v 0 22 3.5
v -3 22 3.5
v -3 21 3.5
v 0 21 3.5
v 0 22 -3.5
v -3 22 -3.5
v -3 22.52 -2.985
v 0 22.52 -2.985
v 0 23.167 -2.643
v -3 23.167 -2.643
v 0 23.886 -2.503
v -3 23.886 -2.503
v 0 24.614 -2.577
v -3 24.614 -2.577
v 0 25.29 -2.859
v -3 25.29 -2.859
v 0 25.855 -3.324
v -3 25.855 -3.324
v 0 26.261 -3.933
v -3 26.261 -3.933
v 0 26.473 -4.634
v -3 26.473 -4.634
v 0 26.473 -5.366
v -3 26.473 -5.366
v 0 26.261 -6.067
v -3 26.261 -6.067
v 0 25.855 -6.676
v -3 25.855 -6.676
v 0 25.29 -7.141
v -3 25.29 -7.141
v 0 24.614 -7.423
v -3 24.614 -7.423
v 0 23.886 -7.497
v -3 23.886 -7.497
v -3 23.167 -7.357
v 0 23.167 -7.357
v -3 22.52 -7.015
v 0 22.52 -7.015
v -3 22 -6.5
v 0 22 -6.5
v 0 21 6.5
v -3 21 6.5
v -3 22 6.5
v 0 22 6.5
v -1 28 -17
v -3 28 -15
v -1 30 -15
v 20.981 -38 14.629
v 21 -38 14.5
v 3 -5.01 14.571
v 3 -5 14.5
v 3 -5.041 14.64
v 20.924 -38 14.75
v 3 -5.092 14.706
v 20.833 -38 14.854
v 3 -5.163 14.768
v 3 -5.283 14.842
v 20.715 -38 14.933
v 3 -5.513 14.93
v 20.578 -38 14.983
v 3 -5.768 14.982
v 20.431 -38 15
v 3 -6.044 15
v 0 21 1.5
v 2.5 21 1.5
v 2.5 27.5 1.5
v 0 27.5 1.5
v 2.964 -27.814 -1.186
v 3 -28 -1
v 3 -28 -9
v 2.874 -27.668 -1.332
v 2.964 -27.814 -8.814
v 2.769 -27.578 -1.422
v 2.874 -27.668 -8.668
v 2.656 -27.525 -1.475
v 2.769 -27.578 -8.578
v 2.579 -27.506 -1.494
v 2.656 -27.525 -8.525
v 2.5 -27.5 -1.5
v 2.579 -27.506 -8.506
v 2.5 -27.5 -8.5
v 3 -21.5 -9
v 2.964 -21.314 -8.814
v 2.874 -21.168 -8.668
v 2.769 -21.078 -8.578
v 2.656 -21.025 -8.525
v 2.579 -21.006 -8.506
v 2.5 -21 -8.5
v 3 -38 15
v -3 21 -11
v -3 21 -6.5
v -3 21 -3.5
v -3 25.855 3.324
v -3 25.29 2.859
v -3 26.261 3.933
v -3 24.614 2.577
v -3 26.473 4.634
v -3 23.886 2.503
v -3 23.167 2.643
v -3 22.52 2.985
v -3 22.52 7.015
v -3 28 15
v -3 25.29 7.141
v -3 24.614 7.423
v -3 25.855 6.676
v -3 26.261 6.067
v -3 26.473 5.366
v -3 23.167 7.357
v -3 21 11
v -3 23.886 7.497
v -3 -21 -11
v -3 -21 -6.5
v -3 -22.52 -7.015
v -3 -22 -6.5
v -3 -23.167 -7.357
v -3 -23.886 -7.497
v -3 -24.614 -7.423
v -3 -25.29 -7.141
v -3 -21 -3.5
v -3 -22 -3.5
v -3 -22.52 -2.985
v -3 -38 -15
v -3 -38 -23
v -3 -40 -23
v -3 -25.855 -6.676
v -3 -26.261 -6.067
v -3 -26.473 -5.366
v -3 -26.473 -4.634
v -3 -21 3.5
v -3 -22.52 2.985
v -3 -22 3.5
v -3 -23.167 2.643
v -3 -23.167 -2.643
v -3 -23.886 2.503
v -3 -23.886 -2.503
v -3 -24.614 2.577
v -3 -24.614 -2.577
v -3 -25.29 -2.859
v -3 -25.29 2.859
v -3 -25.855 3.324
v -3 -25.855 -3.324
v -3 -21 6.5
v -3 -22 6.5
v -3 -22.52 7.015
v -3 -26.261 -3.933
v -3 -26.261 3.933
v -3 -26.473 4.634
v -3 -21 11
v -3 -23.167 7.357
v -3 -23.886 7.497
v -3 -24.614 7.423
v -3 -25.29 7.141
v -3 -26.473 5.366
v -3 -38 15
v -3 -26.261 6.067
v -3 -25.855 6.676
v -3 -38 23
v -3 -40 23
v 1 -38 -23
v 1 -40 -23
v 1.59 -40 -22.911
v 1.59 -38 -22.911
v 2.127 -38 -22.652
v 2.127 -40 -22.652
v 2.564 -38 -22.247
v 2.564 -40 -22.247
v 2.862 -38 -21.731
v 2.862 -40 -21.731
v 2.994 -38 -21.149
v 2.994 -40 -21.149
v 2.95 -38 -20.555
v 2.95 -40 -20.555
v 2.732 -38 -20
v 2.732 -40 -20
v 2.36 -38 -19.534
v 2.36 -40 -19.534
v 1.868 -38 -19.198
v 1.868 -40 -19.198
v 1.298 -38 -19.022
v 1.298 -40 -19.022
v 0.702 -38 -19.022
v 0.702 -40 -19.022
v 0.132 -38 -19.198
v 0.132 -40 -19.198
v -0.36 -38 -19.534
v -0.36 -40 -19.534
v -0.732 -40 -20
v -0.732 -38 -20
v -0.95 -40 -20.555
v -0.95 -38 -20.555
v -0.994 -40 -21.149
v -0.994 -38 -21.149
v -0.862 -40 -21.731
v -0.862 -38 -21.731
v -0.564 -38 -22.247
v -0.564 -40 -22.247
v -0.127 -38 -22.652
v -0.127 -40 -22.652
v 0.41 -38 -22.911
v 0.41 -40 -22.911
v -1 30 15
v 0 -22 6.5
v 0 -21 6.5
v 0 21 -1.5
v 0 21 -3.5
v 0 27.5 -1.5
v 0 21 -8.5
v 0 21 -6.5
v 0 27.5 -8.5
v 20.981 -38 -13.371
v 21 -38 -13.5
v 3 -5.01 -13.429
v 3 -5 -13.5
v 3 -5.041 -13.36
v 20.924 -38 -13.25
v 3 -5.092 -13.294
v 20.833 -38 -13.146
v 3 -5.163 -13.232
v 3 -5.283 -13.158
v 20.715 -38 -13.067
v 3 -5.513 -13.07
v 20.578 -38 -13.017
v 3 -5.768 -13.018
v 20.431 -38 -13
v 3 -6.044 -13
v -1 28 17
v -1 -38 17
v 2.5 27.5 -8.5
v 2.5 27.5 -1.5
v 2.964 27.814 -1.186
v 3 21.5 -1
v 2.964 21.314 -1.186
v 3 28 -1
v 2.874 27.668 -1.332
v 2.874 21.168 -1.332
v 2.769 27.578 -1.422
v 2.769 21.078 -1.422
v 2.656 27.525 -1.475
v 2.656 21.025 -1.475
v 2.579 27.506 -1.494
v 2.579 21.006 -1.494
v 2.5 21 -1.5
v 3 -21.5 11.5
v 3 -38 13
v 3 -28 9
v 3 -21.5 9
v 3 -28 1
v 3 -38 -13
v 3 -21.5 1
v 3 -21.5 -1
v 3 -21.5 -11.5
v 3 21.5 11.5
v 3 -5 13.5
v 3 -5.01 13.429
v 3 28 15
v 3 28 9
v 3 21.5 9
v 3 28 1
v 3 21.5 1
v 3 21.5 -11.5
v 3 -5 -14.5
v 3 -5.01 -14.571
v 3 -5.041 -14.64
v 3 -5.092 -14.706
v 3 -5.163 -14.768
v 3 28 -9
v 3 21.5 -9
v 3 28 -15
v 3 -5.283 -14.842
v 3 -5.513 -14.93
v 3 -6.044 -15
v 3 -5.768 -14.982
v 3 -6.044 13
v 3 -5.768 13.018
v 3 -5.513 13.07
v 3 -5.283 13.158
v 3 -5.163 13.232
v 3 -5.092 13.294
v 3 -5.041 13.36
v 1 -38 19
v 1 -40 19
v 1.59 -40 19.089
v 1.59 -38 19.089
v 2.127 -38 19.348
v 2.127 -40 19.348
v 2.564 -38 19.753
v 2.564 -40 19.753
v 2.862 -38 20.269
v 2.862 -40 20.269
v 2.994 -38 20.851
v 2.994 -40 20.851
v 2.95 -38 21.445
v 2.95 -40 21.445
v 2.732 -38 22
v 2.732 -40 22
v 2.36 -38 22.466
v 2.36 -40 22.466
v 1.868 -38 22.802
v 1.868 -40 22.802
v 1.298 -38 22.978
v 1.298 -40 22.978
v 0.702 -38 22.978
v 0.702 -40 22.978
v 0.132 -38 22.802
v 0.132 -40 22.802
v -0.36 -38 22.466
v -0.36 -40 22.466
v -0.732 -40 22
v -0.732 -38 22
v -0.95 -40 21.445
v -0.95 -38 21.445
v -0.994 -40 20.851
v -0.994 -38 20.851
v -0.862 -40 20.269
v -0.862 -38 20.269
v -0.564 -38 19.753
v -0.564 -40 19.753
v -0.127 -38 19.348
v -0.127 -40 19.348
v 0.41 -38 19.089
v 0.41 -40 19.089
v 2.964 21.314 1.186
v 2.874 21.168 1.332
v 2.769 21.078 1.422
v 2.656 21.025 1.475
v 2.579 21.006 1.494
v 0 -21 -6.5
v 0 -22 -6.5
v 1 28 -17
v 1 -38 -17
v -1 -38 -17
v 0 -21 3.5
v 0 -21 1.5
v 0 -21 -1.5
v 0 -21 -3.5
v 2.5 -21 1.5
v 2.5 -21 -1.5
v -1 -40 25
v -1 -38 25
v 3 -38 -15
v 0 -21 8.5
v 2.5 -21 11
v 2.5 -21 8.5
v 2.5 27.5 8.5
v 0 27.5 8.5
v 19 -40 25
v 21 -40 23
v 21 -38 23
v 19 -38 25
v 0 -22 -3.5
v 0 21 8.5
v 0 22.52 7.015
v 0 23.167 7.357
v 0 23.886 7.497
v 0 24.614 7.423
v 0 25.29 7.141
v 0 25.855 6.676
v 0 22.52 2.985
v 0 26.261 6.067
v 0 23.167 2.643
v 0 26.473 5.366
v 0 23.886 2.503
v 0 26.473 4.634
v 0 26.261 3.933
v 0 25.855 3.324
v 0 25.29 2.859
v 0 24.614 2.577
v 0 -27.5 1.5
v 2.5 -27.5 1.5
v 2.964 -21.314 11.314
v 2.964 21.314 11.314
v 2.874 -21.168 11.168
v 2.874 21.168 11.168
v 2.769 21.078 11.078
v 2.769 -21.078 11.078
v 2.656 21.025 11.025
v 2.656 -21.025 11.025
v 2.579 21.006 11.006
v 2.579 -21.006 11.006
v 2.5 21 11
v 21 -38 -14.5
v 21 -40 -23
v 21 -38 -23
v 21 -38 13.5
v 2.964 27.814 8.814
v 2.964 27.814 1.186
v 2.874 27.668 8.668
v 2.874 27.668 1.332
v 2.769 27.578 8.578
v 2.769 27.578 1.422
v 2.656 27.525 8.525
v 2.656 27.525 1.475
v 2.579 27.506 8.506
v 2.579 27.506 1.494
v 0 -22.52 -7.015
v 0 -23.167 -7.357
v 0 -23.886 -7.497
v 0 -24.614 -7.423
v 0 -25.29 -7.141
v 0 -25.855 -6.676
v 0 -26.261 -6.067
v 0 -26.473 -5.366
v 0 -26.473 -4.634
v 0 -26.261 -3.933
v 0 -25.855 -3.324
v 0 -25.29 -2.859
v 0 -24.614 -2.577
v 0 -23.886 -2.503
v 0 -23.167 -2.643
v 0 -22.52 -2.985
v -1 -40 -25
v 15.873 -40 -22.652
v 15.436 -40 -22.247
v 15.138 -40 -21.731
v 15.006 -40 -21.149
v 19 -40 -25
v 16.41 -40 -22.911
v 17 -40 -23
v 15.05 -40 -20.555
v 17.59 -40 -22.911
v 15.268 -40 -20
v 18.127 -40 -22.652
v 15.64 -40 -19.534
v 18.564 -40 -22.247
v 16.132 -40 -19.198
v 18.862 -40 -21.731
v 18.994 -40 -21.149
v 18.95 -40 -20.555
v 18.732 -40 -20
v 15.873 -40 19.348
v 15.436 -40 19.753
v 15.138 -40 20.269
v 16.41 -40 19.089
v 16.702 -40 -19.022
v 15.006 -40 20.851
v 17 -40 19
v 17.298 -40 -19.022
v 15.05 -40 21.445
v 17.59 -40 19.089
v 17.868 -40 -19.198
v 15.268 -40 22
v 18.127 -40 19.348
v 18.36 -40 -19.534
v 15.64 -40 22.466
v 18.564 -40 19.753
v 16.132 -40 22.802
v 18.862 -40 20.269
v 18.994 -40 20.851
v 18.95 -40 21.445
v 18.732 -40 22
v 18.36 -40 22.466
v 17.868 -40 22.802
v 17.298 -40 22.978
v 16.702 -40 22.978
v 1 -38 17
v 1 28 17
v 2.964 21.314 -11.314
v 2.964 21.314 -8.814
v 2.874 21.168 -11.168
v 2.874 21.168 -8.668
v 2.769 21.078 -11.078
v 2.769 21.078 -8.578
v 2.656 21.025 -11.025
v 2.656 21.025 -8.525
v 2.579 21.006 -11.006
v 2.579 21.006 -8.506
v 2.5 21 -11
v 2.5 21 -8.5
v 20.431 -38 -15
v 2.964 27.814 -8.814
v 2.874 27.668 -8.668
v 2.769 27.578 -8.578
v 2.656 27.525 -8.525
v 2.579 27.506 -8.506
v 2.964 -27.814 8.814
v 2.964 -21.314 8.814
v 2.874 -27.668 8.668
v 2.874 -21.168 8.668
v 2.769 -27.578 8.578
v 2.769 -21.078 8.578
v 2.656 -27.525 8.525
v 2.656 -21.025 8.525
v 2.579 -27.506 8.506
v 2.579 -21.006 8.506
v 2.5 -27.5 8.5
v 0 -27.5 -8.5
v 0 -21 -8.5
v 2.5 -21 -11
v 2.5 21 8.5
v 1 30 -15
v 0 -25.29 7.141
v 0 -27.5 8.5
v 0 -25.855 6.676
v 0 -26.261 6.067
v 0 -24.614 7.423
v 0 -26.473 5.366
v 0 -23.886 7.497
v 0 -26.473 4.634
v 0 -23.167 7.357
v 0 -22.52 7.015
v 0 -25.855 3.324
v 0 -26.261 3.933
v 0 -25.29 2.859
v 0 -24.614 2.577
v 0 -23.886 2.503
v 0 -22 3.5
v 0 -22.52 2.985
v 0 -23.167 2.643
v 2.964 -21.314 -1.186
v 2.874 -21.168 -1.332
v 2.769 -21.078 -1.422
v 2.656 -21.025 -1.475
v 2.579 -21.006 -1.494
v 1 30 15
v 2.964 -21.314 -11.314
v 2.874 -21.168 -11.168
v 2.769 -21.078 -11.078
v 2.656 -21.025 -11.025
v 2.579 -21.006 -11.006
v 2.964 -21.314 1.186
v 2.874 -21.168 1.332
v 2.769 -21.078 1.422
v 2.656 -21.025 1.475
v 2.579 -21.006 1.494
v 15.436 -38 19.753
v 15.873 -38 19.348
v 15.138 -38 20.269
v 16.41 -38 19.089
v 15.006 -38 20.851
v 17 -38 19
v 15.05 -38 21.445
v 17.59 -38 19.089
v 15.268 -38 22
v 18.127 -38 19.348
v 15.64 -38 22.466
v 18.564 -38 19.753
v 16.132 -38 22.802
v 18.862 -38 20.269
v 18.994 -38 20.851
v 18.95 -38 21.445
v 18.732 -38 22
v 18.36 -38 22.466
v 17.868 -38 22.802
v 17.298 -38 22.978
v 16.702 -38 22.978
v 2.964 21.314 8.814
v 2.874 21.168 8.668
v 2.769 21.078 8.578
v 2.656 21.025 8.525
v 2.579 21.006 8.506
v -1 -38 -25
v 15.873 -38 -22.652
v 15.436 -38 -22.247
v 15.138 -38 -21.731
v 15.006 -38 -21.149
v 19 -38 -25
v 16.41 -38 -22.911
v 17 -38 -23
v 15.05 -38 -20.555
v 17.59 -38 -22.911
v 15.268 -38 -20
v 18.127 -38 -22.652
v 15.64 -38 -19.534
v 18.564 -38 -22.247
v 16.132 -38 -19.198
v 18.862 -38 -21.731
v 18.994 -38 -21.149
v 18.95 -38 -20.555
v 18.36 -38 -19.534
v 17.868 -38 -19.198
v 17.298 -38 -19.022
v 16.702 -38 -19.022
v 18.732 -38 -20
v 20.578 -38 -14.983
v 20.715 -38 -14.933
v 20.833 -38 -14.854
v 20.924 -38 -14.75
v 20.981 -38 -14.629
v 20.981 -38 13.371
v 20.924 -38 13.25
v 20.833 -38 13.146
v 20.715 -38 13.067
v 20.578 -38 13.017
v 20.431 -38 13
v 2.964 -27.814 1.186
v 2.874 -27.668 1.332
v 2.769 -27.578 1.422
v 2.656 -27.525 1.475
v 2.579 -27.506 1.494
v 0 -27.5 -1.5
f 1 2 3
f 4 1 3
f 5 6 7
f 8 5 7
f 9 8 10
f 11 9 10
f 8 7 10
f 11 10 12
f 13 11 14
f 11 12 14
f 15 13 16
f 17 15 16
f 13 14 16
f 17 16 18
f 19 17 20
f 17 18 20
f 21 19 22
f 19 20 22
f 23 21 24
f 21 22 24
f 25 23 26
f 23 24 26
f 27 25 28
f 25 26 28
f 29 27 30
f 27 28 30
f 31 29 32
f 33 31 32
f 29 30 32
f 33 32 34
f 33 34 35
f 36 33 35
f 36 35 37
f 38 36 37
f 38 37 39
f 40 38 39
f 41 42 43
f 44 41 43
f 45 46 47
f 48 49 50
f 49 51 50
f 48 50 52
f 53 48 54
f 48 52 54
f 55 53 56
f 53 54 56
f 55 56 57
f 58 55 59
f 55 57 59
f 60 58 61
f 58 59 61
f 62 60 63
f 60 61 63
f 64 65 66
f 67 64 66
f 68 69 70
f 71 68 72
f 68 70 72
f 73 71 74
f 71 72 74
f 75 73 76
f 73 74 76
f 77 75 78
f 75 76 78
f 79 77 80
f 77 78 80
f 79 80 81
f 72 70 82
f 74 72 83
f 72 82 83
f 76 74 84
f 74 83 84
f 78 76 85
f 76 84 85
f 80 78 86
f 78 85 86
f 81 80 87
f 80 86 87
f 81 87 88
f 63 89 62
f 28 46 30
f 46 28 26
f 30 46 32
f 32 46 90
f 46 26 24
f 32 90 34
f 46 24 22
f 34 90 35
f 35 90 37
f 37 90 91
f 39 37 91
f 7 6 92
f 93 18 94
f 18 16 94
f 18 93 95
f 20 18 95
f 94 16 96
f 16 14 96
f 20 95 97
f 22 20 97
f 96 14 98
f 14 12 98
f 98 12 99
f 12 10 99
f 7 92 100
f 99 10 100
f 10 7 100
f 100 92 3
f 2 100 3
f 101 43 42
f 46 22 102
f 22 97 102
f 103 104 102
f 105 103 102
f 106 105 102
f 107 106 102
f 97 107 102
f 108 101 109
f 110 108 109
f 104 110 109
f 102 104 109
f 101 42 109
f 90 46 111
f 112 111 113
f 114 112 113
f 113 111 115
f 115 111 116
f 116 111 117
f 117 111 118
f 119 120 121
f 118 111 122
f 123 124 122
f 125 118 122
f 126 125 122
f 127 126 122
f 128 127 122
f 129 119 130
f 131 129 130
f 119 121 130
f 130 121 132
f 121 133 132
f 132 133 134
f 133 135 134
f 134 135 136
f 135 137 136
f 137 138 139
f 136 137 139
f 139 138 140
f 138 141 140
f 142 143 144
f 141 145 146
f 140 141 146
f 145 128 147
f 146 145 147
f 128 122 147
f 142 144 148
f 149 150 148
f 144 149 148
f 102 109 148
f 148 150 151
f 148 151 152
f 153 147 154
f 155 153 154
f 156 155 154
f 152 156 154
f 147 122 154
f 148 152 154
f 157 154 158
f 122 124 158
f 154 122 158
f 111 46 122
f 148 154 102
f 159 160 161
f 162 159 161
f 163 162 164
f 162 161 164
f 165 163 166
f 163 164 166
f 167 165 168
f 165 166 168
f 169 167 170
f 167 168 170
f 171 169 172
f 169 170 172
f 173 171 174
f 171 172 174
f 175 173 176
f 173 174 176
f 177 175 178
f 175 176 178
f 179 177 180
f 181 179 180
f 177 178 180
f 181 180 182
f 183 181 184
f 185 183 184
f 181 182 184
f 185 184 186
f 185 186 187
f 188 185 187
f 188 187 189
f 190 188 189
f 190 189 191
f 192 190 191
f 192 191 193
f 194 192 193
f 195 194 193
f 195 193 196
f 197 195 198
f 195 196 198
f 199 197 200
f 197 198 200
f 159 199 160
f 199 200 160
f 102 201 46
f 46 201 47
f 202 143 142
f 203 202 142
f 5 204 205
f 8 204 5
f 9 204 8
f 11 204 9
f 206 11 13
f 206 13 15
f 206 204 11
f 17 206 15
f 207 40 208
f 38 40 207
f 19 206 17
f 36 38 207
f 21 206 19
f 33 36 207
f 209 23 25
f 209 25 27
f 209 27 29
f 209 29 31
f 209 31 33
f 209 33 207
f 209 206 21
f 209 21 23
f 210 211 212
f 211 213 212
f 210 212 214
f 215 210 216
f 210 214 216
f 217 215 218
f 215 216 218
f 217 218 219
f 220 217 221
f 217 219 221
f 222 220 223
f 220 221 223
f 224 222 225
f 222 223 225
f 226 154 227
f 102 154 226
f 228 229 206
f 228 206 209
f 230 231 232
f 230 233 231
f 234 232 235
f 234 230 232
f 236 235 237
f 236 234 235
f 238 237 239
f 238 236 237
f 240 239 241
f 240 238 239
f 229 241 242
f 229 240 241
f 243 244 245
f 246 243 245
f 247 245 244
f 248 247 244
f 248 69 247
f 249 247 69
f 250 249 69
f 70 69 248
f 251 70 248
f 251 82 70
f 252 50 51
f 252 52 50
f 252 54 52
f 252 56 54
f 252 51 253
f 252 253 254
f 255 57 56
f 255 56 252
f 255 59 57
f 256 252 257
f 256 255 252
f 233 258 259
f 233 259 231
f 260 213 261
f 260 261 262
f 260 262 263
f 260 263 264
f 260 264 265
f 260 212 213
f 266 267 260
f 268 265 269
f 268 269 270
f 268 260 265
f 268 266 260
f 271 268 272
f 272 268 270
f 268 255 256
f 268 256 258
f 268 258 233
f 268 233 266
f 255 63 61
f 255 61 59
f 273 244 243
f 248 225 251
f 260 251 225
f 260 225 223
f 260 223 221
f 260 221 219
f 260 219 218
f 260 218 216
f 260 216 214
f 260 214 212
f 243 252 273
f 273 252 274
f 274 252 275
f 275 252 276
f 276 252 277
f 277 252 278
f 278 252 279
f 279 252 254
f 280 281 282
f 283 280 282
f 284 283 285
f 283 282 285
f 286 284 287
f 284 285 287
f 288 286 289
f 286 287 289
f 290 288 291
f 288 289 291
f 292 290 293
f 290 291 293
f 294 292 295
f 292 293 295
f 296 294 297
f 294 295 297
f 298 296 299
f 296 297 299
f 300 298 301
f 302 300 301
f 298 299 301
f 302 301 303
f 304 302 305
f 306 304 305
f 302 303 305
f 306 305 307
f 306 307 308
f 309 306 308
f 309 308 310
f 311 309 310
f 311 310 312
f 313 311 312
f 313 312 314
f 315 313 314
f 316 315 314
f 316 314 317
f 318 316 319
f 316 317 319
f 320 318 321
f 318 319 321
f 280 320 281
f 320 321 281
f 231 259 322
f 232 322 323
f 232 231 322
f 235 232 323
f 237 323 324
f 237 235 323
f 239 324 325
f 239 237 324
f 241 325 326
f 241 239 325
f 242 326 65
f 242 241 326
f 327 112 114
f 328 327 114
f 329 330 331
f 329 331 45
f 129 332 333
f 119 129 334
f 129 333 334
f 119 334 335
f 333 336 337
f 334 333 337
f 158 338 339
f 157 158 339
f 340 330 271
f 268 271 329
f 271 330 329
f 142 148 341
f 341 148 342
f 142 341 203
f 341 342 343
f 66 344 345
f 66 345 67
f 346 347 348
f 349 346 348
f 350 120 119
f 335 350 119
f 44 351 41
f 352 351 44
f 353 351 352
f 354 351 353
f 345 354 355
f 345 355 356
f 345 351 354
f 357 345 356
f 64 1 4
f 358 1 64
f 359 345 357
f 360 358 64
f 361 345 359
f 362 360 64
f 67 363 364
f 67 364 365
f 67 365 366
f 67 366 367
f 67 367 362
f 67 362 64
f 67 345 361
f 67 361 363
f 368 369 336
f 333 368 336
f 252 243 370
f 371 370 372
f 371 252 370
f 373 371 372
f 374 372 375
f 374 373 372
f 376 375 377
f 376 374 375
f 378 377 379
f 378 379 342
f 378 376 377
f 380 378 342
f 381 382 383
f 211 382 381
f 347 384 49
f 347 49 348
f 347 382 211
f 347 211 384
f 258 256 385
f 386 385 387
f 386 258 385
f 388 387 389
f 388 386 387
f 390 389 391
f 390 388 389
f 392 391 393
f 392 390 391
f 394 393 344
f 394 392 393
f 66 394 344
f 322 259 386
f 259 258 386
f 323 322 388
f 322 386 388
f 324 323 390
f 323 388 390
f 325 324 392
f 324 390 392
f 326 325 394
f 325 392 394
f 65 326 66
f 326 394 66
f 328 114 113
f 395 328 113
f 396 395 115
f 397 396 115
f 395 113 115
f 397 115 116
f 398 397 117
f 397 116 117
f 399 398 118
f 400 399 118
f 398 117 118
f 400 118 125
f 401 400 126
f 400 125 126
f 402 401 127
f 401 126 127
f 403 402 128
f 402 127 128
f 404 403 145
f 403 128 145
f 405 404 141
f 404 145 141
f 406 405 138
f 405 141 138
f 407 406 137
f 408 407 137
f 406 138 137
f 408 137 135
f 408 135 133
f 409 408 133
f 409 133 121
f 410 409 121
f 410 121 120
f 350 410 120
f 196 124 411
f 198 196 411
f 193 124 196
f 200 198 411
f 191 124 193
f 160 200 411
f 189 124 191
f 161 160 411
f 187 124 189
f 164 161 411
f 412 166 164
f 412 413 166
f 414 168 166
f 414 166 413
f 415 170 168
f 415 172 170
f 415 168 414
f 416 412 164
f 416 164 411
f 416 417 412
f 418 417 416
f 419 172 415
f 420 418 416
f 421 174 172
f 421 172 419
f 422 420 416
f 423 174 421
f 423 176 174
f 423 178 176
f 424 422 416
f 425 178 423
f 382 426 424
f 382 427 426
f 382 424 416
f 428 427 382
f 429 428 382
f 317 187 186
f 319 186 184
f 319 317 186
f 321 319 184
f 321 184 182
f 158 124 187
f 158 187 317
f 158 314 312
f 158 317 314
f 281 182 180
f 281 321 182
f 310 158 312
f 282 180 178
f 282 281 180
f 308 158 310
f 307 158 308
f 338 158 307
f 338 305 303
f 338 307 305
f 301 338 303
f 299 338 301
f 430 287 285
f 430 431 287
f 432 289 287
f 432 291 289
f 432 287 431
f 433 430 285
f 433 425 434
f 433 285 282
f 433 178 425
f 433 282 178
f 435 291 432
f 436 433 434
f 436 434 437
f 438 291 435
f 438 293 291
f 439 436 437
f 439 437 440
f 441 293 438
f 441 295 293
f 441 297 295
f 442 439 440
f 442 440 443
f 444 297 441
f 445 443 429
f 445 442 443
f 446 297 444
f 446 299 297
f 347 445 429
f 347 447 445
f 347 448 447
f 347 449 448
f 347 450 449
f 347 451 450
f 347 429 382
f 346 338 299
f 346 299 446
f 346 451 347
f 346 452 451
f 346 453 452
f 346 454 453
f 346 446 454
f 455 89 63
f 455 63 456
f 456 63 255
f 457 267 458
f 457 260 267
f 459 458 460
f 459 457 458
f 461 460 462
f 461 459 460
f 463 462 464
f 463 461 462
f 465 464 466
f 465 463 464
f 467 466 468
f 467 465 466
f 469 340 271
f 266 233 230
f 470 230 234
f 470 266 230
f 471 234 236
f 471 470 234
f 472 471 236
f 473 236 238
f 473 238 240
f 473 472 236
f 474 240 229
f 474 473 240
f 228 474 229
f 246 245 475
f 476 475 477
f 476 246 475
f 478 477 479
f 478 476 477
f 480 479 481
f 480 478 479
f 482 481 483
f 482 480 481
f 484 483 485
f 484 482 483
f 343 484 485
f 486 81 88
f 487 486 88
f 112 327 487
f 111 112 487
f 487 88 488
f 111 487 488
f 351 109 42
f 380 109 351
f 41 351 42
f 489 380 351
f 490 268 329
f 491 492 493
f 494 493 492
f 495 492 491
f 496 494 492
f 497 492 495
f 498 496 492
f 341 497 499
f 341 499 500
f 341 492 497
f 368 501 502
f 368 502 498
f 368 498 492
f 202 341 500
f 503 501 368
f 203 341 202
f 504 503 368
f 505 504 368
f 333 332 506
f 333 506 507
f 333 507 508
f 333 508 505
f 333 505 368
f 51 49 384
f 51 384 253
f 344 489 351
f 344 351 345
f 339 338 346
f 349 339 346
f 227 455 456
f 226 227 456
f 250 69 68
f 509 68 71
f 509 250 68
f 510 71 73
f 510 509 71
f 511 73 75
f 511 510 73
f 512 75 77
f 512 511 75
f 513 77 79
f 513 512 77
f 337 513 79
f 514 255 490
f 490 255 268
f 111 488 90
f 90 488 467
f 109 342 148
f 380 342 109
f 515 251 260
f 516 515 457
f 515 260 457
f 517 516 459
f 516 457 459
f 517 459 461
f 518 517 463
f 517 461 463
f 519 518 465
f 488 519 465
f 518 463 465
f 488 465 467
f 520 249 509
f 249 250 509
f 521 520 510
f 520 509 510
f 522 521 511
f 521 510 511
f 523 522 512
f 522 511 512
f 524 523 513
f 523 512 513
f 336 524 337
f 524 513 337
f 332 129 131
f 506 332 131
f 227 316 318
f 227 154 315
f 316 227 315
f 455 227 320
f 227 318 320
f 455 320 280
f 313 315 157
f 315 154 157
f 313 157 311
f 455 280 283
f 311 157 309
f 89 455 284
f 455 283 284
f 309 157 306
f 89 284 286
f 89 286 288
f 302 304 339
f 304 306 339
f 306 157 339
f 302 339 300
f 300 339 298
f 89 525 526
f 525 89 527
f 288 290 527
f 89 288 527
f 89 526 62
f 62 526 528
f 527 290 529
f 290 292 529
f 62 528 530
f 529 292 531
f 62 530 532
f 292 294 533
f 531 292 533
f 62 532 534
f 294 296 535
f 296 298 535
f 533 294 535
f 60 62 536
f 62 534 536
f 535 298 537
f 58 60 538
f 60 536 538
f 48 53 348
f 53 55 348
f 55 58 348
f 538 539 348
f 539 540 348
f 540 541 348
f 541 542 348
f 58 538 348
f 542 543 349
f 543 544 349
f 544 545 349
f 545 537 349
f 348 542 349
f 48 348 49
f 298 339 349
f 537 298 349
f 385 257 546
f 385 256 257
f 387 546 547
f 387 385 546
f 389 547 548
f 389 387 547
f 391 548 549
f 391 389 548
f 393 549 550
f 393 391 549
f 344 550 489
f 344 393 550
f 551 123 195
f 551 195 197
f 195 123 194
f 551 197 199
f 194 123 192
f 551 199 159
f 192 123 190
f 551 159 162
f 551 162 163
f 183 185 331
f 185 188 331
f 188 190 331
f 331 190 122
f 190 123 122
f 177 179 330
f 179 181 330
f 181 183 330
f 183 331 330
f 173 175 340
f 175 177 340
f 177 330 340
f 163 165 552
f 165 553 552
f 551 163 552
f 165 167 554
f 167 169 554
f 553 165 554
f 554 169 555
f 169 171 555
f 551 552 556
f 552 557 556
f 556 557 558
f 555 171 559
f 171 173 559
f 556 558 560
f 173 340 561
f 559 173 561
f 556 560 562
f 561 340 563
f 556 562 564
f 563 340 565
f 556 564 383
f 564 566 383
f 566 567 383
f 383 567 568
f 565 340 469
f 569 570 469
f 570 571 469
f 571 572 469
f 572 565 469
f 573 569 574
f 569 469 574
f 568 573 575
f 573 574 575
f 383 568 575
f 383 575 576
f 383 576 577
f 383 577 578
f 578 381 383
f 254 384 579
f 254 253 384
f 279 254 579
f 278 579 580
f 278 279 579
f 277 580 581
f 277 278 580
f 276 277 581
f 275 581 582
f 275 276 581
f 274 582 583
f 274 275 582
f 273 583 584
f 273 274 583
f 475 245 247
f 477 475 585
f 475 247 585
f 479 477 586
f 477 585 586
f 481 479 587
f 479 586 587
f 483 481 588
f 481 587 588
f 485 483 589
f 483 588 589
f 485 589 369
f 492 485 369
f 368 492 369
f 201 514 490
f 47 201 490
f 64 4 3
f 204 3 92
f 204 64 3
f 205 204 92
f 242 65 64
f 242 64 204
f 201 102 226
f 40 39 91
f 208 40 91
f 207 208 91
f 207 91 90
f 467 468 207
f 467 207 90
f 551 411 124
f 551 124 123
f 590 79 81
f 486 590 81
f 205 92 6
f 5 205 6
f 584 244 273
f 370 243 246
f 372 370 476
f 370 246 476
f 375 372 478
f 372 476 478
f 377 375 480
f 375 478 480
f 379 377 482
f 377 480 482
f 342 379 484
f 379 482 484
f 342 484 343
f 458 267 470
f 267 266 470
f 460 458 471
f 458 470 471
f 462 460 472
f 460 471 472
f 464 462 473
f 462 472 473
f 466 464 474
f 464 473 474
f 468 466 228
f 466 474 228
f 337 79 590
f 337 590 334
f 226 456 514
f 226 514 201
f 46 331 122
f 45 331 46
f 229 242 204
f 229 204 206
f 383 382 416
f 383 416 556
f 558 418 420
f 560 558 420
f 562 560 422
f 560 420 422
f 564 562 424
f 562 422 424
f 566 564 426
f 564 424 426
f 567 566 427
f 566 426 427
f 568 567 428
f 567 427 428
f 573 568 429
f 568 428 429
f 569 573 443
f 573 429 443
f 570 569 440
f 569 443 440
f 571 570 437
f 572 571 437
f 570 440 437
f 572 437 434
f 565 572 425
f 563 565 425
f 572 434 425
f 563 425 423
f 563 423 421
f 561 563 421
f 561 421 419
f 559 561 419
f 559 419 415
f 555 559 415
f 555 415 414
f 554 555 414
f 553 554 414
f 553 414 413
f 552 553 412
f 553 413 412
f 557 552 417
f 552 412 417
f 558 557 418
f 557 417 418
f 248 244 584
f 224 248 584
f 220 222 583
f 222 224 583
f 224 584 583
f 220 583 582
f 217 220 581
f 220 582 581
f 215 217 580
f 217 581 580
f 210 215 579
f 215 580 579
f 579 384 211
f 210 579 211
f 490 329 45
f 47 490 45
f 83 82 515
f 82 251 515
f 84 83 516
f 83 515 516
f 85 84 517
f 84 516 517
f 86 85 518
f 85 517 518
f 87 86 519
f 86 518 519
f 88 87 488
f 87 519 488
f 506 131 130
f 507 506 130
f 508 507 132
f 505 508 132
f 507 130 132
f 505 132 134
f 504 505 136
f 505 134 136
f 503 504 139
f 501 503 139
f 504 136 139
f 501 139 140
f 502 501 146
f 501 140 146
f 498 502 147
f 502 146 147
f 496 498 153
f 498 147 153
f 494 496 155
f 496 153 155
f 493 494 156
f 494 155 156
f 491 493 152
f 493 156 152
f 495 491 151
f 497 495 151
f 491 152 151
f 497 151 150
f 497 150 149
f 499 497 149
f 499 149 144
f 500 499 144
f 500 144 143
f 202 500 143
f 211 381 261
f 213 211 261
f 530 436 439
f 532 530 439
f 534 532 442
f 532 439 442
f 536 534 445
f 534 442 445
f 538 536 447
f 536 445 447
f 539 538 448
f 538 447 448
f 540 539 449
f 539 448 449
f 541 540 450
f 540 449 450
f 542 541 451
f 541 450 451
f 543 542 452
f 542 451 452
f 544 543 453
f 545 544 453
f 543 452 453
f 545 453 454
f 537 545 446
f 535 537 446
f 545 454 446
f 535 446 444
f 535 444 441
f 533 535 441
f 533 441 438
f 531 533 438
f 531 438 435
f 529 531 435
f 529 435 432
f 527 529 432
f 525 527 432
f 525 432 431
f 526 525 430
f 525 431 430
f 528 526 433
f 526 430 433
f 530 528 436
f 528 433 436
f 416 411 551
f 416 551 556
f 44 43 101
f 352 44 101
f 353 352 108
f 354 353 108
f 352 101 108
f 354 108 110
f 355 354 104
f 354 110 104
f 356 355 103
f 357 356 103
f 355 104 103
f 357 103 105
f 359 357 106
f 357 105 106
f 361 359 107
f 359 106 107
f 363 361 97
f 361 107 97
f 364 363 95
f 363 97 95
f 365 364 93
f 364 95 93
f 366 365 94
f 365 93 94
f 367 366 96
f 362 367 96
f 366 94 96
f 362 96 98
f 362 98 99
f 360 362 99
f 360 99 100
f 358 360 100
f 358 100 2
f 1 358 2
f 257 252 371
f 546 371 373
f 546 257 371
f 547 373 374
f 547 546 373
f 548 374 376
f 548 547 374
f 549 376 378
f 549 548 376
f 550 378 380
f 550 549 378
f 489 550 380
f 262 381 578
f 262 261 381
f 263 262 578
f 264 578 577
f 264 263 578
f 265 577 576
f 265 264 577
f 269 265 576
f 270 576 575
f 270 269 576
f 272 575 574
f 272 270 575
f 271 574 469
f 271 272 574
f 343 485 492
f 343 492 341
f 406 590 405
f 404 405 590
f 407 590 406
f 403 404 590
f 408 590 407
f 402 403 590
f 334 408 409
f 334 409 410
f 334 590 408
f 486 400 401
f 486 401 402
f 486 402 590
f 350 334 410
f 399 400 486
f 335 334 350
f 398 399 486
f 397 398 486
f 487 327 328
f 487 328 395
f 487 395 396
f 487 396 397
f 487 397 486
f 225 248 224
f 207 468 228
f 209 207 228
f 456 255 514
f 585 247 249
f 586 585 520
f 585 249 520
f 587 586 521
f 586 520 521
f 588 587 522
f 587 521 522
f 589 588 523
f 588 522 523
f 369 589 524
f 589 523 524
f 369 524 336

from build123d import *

# Parameters (mm, degrees)
SKETCH1_W           = 34
SKETCH1_H           = 70
SKETCH1_W_2         = 22
SKETCH1_H_2         = 42
BOSS_EXTRUDE1_DEPTH = 3
CUT_EXTRUDE1_DEPTH  = 44.874821937
CHAMFER1_SIZE       = 2
SKETCH3_W           = 7
SKETCH3_H           = 7
CUT_EXTRUDE2_DEPTH  = 3
SKETCH4_W           = 24
SKETCH4_H           = 50
SKETCH4_R           = 2
BOSS_EXTRUDE2_DEPTH = 2
CHAMFER2_SIZE       = 2
BOSS_EXTRUDE3_START = -10
BOSS_EXTRUDE3_DEPTH = 2
BOSS_EXTRUDE4_START = -40
BOSS_EXTRUDE4_DEPTH = 2
FILLET1_R           = 0.5


with BuildPart() as part:
    # Sketch1 → Boss-Extrude1 (new, symmetric)
    with BuildSketch(Plane(origin=(0, 0, 0), x_dir=(0, 0, -1), z_dir=(1, 0, 0))):
        with Locations((0, -5)):
            Rectangle(SKETCH1_W, SKETCH1_H)
        Rectangle(SKETCH1_W_2, SKETCH1_H_2, mode=Mode.SUBTRACT)
    extrude(amount=BOSS_EXTRUDE1_DEPTH, both=True)

    # Sketch2 → Cut-Extrude1 (cut, through all)
    with BuildSketch(Plane.ZY.offset(3)):
        with BuildLine():
            Line((-6.5, -21), (-6.5, -22))
            ThreePointArc((-6.5, -22), (-5, -26.5), (-3.5, -22))
            Line((-3.5, -22), (-3.5, -21))
            Line((-3.5, -21), (-6.5, -21))
        make_face()
        with BuildLine():
            Line((3.5, -21), (3.5, -22))
            ThreePointArc((3.5, -22), (5, -26.5), (6.5, -22))
            Line((6.5, -22), (6.5, -21))
            Line((6.5, -21), (3.5, -21))
        make_face()
        with BuildLine():
            Line((6.5, 21), (6.5, 22))
            ThreePointArc((6.5, 22), (5, 26.5), (3.5, 22))
            Line((3.5, 22), (3.5, 21))
            Line((3.5, 21), (6.5, 21))
        make_face()
        with BuildLine():
            Line((-3.5, 21), (-3.5, 22))
            ThreePointArc((-3.5, 22), (-5, 26.5), (-6.5, 22))
            Line((-6.5, 22), (-6.5, 21))
            Line((-6.5, 21), (-3.5, 21))
        make_face()
    extrude(amount=-CUT_EXTRUDE1_DEPTH, mode=Mode.SUBTRACT)

    # Chamfer1
    chamfer1_edges = [part.edges().sort_by_distance(p)[0] for p in [
        (3, -5, 17),
        (3, 30, 0),
        (-3, -5, 17),
        (-3, -5, -17),
        (-3, 30, 0),
        (3, -5, -17),
        (0, 30, 17),
        (0, 30, -17),
    ]]
    chamfer(chamfer1_edges, length=CHAMFER1_SIZE)

    # Sketch3 → Cut-Extrude2 (cut)
    with BuildSketch(Plane(origin=(3, 0, 0), x_dir=(0, 0, -1), z_dir=(1, 0, 0))):
        with Locations((5, 24)):
            Rectangle(SKETCH3_W, SKETCH3_H)
        with Locations((5, -24)):
            Rectangle(SKETCH3_W, SKETCH3_H)
        with Locations((-5, -24)):
            Rectangle(SKETCH3_W, SKETCH3_H)
        with Locations((-5, 24)):
            Rectangle(SKETCH3_W, SKETCH3_H)
    extrude(amount=-CUT_EXTRUDE2_DEPTH, mode=Mode.SUBTRACT)

    # Sketch4 → Boss-Extrude2 (add)
    with BuildSketch(Plane.XZ.offset(40)):
        with Locations((9, 0)):
            Rectangle(SKETCH4_W, SKETCH4_H)
        with Locations(Location((1, -21, 0), (0, 0, 270))):
            Circle(SKETCH4_R, mode=Mode.SUBTRACT)
        with Locations(Location((17, -21, 0), (0, 0, 270))):
            Circle(SKETCH4_R, mode=Mode.SUBTRACT)
        with Locations(Location((17, 21, 0), (0, 0, 270))):
            Circle(SKETCH4_R, mode=Mode.SUBTRACT)
        with Locations(Location((1, 21, 0), (0, 0, 270))):
            Circle(SKETCH4_R, mode=Mode.SUBTRACT)
    extrude(amount=-BOSS_EXTRUDE2_DEPTH)

    # Chamfer2
    chamfer2_edges = [part.edges().sort_by_distance(p)[0] for p in [
        (-3, -39, -25),
        (-3, -39, 25),
        (21, -39, 25),
        (21, -39, -25),
    ]]
    chamfer(chamfer2_edges, length=CHAMFER2_SIZE)

    # Sketch5 → Boss-Extrude3 (add)
    with BuildSketch(Plane(origin=(0, 0, -25), x_dir=(-1, 0, 0), z_dir=(0, 0, -1)).offset(BOSS_EXTRUDE3_START)):
        Polygon((-3, -38), (-21, -38), (-3, -5), align=None)
    extrude(amount=-BOSS_EXTRUDE3_DEPTH)

    # Sketch5<2> → Boss-Extrude4 (add)
    with BuildSketch(Plane(origin=(0, 0, -25), x_dir=(-1, 0, 0), z_dir=(0, 0, -1)).offset(BOSS_EXTRUDE4_START)):
        Polygon((-3, -38), (-21, -38), (-3, -5), align=None)
    extrude(amount=BOSS_EXTRUDE4_DEPTH)

    # Fillet1
    fillet1_edges = [part.edges().sort_by_distance(p)[0] for p in [
        (3, 21, -9.75),
        (3, 24.25, -8.5),
        (3, 27.5, -5),
        (3, 24.25, -1.5),
        (3, -21, -9.75),
        (3, -24.25, -1.5),
        (3, -27.5, -5),
        (3, -24.25, -8.5),
        (3, 21, 9.75),
        (3, 0, 11),
        (3, -21, 9.75),
        (3, -21, 0),
        (3, 0, -11),
        (3, -24.25, 8.5),
        (3, -27.5, 5),
        (3, -24.25, 1.5),
        (3, 21, 0),
        (3, 24.25, 1.5),
        (3, 27.5, 5),
        (3, 24.25, 8.5),
        (12, -21.5, -13),
        (12, -21.5, -15),
        (12, -21.5, 13),
        (12, -21.5, 15),
    ]]
    fillet(fillet1_edges, radius=FILLET1_R - 0.0001)  # a hair under: the kernel refuses the full size


solid = part.part
